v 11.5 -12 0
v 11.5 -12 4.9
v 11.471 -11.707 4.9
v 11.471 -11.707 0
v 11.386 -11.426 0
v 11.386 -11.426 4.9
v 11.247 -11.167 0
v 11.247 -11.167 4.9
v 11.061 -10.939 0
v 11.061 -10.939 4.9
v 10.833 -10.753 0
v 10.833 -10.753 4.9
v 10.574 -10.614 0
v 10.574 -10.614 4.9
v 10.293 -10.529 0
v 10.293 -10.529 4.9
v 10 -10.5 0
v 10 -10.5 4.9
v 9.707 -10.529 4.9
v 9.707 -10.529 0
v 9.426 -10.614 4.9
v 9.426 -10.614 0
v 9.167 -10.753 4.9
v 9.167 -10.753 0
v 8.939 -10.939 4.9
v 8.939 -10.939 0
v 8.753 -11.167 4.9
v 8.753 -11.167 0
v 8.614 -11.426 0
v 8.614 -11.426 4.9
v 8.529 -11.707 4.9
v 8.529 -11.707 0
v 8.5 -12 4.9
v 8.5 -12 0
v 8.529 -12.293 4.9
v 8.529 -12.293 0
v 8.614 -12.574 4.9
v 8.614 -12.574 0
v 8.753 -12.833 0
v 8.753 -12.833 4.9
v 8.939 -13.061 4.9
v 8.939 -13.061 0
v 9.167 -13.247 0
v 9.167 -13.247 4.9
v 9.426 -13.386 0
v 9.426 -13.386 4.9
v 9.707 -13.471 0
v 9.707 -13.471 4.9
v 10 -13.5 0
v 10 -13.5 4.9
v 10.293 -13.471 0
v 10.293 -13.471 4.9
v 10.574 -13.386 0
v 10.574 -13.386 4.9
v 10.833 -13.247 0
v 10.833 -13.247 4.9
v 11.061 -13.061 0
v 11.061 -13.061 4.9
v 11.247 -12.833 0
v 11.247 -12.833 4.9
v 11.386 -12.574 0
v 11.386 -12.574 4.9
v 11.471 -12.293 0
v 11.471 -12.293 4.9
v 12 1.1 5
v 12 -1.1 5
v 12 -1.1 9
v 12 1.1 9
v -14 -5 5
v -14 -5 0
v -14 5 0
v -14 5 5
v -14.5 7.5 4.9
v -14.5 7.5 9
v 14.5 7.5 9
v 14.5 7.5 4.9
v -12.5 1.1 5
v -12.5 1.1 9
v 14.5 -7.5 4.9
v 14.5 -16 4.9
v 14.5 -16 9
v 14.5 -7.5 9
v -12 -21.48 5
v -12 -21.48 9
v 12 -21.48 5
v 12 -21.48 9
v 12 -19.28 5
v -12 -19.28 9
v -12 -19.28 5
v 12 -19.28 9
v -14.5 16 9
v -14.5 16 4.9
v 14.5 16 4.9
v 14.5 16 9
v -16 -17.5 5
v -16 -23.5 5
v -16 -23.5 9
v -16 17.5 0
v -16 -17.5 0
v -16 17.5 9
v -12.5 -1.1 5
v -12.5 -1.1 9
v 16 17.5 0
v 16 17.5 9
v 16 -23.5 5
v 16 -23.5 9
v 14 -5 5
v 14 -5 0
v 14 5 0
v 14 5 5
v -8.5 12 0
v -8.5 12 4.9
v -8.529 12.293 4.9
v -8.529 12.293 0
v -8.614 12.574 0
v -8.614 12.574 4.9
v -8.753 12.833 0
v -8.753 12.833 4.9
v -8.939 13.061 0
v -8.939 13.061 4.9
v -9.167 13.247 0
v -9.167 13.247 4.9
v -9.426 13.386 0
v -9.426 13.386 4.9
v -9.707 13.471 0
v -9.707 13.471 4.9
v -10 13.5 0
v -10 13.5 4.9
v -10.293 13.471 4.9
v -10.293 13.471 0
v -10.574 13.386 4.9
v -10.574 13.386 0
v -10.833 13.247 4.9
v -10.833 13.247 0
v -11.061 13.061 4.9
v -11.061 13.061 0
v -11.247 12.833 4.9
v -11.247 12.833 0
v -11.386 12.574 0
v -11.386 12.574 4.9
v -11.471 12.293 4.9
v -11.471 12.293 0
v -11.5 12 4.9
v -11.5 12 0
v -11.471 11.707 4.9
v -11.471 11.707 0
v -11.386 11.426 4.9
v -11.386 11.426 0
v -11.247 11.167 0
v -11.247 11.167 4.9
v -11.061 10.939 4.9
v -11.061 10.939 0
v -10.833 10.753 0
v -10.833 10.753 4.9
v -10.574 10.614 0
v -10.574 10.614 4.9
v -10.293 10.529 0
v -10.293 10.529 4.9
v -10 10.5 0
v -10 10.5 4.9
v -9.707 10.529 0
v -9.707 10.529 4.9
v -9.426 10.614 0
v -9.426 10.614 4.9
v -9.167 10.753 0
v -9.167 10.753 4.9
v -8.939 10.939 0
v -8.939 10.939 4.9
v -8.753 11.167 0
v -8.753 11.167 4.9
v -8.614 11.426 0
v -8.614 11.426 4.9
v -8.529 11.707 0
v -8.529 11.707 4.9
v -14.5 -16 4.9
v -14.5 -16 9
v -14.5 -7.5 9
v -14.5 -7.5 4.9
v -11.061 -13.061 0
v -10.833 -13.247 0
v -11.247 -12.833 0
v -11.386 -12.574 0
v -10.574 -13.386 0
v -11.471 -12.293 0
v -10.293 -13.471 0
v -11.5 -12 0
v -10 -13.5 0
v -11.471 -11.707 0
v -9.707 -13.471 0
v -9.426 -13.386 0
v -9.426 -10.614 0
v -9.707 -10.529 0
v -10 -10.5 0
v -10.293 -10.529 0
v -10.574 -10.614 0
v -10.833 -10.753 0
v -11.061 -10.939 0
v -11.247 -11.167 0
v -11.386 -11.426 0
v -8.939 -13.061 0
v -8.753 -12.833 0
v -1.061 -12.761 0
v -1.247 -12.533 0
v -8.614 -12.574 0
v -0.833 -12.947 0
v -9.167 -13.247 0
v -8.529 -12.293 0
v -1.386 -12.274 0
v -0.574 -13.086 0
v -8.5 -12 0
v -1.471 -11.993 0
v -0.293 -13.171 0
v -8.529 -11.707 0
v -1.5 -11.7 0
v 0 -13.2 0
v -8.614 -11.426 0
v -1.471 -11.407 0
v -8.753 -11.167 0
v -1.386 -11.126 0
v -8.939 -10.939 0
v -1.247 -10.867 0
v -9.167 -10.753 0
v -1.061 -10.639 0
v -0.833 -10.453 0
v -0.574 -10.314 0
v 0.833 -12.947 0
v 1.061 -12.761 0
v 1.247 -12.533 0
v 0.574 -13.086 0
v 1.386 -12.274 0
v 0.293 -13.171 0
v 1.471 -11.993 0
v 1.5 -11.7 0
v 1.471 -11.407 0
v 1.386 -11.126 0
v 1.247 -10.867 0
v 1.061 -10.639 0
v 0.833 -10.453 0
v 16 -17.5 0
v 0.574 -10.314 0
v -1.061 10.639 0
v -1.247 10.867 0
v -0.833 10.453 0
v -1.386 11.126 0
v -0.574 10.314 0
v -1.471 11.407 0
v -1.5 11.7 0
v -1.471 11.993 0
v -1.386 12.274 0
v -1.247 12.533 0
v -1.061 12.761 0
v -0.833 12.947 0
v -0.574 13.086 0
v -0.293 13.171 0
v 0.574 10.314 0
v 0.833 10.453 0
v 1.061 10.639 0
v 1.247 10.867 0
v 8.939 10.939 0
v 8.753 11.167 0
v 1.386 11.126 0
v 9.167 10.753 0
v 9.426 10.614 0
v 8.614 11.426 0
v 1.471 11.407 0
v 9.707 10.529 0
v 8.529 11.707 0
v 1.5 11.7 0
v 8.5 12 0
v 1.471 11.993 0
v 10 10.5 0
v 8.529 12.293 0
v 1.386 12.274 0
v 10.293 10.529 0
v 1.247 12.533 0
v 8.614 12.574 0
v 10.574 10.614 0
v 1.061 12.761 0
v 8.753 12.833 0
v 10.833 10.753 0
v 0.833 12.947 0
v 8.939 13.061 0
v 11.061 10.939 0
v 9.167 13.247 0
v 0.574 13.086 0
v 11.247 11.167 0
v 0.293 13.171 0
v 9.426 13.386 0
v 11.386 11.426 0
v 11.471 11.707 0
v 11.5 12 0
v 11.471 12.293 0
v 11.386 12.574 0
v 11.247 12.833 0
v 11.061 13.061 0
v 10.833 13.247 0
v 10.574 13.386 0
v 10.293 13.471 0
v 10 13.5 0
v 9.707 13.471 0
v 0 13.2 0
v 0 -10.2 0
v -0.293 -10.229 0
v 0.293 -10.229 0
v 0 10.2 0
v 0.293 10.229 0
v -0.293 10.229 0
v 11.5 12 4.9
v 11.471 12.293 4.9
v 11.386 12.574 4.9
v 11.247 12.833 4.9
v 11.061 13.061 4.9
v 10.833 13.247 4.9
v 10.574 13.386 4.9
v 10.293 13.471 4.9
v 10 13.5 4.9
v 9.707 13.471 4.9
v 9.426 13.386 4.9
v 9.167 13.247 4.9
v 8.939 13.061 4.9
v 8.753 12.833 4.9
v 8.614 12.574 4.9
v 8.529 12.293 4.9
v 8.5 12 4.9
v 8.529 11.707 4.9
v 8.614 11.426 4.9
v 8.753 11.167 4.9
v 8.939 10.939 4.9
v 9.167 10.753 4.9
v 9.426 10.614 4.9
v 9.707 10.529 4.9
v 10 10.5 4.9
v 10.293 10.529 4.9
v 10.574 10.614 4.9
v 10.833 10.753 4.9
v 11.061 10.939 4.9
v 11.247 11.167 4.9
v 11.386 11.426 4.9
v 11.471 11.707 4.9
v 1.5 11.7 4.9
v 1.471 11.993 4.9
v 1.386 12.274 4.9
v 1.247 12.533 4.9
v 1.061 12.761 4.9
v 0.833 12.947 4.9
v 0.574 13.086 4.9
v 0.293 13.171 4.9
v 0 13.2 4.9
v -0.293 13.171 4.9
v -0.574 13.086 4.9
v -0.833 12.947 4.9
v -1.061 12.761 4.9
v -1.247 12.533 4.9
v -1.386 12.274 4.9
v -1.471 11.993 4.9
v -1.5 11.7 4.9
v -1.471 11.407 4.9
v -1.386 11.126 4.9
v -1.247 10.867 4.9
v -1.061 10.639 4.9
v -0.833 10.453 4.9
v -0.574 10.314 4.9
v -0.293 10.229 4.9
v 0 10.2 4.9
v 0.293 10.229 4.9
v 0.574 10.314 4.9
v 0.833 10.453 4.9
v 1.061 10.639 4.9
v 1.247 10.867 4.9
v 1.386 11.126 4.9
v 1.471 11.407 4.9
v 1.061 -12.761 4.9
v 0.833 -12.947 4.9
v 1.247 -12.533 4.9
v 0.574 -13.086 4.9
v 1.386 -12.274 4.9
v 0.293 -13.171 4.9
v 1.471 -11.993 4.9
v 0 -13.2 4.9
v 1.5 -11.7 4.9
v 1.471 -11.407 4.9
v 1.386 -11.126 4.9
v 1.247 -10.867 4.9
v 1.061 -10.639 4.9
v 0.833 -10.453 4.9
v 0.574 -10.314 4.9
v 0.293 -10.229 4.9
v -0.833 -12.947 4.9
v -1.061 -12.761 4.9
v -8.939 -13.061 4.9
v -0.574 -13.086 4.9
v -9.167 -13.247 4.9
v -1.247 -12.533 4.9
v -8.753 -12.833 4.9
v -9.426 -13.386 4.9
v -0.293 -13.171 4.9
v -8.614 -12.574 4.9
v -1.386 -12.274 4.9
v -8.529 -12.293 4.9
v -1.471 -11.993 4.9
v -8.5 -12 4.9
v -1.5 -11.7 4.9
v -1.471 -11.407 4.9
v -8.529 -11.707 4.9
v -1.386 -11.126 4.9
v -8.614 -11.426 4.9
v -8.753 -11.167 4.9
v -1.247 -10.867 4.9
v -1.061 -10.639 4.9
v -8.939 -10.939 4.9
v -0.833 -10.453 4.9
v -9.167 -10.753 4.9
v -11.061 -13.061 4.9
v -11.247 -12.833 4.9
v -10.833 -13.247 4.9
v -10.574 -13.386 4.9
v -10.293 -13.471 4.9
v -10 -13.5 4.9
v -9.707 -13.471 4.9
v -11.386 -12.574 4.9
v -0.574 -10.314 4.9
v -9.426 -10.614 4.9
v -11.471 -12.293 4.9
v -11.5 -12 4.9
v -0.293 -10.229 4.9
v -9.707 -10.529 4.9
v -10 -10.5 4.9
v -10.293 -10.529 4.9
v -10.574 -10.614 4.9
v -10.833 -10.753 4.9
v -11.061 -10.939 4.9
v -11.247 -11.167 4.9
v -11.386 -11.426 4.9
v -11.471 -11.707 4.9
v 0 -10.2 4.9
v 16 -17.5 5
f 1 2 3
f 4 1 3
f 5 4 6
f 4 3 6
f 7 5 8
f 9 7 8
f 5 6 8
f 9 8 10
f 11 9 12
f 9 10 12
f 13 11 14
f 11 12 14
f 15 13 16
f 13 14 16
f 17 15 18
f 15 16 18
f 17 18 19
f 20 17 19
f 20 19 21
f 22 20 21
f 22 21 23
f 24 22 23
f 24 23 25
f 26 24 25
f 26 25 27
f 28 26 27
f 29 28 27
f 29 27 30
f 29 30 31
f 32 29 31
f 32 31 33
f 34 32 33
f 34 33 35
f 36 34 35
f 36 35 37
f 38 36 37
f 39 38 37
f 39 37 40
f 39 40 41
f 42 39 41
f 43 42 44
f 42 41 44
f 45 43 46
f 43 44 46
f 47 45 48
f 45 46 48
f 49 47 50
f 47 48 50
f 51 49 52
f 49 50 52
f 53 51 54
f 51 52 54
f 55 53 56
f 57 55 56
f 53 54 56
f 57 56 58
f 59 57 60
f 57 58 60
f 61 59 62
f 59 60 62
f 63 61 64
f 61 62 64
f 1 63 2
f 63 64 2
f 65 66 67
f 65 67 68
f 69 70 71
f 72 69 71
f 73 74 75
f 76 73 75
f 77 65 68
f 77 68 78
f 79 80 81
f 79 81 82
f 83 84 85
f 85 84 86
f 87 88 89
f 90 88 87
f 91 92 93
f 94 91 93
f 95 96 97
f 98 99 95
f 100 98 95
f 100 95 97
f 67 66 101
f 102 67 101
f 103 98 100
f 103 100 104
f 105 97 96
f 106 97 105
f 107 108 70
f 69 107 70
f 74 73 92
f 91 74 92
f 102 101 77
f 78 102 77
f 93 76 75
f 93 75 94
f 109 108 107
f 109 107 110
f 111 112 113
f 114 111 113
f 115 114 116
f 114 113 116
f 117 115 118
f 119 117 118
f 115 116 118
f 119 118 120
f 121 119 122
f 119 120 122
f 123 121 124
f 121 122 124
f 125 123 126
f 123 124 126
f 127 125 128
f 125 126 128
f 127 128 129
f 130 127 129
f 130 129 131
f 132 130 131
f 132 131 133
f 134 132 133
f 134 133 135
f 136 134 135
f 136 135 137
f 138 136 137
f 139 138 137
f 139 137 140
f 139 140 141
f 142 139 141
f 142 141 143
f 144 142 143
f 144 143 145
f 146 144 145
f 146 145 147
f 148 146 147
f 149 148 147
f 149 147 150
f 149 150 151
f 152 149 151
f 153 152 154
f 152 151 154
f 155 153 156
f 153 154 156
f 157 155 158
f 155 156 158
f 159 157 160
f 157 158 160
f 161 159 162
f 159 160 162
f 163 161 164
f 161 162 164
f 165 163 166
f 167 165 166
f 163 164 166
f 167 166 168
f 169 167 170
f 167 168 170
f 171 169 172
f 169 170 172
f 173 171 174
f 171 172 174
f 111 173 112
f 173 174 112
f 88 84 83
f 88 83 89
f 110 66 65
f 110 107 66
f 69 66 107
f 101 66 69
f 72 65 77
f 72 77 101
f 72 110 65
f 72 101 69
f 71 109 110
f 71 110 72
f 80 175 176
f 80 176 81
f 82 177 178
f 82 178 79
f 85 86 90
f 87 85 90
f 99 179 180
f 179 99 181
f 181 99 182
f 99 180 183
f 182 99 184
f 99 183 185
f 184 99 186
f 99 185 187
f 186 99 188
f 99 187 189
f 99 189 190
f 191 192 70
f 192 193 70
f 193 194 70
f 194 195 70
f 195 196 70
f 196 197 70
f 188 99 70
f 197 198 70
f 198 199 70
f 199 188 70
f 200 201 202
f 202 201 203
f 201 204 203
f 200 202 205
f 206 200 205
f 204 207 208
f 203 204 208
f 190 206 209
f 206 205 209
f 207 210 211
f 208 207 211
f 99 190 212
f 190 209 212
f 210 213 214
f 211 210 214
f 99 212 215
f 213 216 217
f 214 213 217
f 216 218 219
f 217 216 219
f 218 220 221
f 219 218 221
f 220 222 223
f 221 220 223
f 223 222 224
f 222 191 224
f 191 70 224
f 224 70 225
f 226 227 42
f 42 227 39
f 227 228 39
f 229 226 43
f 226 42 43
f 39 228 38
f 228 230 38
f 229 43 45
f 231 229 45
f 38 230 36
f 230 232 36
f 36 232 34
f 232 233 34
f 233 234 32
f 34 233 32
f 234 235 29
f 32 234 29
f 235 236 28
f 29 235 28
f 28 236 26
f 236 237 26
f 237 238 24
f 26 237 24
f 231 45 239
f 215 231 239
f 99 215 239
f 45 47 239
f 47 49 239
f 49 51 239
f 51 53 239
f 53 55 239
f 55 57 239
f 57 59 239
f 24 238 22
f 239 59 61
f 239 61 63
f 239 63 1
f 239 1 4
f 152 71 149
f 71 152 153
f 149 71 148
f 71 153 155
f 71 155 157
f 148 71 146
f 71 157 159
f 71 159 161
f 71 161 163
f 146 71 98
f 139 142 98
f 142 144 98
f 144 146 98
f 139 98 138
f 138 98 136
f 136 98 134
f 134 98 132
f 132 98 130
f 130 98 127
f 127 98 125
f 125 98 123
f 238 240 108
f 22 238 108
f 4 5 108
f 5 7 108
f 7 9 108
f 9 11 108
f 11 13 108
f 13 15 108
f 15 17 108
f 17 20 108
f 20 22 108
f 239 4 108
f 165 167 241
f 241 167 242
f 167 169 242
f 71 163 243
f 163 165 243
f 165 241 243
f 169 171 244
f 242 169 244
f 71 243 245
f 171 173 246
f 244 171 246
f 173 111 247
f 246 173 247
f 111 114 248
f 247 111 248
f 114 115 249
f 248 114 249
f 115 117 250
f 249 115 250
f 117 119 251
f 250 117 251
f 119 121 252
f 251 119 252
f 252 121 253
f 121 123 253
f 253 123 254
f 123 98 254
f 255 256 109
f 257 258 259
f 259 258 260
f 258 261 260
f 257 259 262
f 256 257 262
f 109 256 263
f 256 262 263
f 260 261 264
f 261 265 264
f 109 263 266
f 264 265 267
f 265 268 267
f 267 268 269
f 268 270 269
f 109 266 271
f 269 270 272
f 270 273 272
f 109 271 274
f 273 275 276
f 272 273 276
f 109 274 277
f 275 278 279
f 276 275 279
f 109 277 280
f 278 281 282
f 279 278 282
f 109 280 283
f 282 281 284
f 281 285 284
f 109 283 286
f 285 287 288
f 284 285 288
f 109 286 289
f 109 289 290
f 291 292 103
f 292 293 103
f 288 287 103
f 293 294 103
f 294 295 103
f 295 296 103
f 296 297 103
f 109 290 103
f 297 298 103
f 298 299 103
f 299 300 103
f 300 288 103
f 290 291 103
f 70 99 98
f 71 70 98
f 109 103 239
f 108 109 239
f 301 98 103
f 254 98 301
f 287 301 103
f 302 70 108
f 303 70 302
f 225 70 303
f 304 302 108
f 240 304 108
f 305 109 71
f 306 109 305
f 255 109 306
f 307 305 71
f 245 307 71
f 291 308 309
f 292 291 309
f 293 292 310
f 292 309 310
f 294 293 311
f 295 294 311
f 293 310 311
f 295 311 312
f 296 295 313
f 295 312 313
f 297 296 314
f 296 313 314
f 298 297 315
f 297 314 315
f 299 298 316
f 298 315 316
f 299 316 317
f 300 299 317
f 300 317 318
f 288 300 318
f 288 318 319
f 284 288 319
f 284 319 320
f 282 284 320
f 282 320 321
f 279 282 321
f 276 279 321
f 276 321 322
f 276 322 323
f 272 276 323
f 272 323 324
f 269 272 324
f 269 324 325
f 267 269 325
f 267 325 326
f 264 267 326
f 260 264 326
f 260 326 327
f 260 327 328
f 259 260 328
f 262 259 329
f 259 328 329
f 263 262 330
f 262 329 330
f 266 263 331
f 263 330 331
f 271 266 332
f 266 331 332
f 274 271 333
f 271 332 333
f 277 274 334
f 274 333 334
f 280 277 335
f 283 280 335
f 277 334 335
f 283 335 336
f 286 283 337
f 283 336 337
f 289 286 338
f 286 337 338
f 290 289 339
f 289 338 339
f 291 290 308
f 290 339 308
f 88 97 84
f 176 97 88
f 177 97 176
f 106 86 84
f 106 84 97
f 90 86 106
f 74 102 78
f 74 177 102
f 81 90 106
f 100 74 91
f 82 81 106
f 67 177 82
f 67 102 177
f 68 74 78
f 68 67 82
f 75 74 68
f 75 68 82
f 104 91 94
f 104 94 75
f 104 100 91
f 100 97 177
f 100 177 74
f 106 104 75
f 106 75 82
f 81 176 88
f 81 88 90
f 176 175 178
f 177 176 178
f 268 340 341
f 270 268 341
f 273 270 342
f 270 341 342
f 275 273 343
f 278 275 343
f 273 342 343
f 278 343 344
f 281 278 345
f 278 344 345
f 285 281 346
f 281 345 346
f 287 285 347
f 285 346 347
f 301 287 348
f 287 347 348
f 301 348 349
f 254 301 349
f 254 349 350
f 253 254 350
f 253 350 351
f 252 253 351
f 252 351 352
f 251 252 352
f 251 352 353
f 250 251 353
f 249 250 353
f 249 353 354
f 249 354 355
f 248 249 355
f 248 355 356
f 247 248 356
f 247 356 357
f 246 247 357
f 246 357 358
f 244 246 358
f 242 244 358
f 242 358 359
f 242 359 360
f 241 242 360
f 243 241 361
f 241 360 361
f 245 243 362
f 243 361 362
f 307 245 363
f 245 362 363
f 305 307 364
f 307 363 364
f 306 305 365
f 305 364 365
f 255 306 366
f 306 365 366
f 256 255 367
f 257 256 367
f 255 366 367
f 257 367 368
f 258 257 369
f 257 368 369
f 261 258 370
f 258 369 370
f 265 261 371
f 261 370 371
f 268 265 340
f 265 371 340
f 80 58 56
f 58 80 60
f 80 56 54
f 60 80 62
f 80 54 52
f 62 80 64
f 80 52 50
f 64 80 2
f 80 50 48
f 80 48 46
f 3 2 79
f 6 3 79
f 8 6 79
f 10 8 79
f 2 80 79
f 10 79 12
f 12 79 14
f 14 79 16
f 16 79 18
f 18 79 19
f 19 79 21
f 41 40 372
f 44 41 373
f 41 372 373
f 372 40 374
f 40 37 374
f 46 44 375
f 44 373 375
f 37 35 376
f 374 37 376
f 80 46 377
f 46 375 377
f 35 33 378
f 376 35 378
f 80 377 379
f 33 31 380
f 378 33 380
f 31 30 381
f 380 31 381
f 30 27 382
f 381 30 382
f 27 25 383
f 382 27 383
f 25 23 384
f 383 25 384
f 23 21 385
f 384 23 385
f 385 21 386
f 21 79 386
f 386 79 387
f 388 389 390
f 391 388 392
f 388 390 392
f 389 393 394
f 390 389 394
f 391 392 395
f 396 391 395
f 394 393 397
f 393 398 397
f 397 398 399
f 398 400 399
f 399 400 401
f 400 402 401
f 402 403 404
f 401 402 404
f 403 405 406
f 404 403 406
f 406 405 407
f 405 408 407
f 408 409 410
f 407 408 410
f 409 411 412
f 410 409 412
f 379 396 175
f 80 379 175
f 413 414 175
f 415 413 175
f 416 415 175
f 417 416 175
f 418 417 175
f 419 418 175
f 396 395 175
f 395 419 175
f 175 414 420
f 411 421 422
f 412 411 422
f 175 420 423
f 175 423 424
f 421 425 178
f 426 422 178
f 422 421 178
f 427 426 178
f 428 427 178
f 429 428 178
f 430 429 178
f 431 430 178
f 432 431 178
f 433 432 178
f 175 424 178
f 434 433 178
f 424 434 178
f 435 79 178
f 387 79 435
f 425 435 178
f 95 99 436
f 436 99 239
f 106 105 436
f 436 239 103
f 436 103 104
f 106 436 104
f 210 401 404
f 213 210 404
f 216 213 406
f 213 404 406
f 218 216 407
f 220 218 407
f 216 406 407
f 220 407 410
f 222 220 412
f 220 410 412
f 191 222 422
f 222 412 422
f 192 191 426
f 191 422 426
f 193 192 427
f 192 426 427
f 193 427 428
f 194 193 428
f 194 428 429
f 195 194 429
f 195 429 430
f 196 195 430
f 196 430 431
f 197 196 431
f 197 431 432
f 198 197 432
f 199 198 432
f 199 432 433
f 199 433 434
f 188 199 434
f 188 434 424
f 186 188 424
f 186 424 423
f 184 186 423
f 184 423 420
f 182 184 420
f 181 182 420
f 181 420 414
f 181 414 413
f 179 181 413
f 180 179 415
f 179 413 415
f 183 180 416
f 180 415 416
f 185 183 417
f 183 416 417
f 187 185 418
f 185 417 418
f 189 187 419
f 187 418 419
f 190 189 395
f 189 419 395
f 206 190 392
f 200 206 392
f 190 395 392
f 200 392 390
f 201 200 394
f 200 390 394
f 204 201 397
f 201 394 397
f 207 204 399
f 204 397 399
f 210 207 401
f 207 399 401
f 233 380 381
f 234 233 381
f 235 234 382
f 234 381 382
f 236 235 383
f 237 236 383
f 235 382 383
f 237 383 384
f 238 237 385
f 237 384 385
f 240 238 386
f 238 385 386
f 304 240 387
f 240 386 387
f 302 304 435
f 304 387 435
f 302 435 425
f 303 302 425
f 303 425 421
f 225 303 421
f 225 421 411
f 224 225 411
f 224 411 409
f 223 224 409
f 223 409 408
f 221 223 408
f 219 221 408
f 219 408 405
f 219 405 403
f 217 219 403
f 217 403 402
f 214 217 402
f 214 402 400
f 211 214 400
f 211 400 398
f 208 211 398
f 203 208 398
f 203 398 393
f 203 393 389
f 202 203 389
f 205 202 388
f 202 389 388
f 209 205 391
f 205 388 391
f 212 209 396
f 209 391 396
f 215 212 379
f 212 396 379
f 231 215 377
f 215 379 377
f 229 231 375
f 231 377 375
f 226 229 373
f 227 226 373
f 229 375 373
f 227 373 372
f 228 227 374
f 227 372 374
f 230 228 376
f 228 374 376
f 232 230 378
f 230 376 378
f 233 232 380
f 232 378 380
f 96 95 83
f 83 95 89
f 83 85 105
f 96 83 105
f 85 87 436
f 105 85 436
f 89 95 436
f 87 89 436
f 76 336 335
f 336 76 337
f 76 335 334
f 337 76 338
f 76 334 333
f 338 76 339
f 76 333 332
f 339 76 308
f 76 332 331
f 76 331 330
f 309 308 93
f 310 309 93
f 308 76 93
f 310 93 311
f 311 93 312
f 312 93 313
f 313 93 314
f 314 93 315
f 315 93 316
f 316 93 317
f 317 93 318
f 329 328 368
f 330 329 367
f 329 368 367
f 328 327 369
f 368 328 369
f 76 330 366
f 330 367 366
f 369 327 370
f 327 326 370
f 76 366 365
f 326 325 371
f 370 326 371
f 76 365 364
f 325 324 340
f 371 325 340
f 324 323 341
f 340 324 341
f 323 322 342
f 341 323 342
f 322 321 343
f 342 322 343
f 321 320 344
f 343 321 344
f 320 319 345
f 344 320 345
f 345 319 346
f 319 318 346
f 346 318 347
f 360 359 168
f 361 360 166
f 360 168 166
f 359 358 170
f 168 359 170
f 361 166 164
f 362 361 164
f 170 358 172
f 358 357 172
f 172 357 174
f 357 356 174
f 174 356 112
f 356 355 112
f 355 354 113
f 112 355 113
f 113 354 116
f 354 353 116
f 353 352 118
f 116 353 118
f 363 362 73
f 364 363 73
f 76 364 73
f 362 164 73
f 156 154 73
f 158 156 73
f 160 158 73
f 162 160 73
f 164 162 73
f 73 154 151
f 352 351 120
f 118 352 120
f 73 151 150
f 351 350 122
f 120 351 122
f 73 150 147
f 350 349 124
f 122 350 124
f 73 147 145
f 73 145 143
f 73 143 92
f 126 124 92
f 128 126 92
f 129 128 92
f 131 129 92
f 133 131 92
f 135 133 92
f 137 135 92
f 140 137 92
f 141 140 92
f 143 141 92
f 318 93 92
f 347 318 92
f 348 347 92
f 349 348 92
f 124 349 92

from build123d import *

# Parameters (mm, degrees)
SKETCH4_W                 = 32
SKETCH4_H                 = 35
BOSS_EXTRUDE1_DEPTH       = 9
SHELL1_T                  = -1.5
SHELL1_THICKNESS_2_FACE_W = 29
SHELL1_THICKNESS_2_FACE_H = 32
SHELL1_THICKNESS_2_DEPTH  = 3.4
SKETCH5_R                 = 1.5
CUT_EXTRUDE2_DEPTH        = 9
RIB6_REACH                = 27.362
SKETCH12_WALLS_W          = 81.724747412
SKETCH12_WALLS_H          = 15
SKETCH13_W                = 28
SKETCH13_H                = 10
CUT_EXTRUDE3_DEPTH        = 5
SKETCH15_W                = 24.5
SKETCH15_H                = 2.2
CUT_EXTRUDE4_DEPTH        = 10
SKETCH16_W                = 32
SKETCH16_H                = 4
BOSS_EXTRUDE2_DEPTH       = 6
SKETCH17_W                = 24
SKETCH17_H                = 2.2
CUT_EXTRUDE5_DEPTH        = 10


with BuildPart() as part:
    # Sketch4 → Boss-Extrude1 (new body)
    with BuildSketch(Plane.XY):
        Rectangle(SKETCH4_W, SKETCH4_H)
    extrude(amount=BOSS_EXTRUDE1_DEPTH)

    # Shell1
    shell1_openings = [part.faces().sort_by_distance(p)[0] for p in [
        (0, 0, 9),
    ]]
    offset(amount=SHELL1_T, openings=shell1_openings, kind=Kind.INTERSECTION)

    # Shell1 thickness 2 face (on inner face of the shell) → Shell1 thickness 2 (add)
    with BuildSketch(Plane(origin=(0, 0, 1.5), x_dir=(-1, 0, 0), z_dir=(0, 0, -1))):
        Rectangle(SHELL1_THICKNESS_2_FACE_W, SHELL1_THICKNESS_2_FACE_H)
    extrude(amount=-SHELL1_THICKNESS_2_DEPTH)

    # Sketch5 → Cut-Extrude2 (cut)
    with BuildSketch(Plane.XY.offset(4.9)):
        with Locations((-10, -12)):
            Circle(SKETCH5_R)
        with Locations((10, -12)):
            Circle(SKETCH5_R)
        with Locations((0, 11.7)):
            Circle(SKETCH5_R)
        with Locations((0, -11.7)):
            Circle(SKETCH5_R)
        with Locations((-10, 12)):
            Circle(SKETCH5_R)
        with Locations((10, 12)):
            Circle(SKETCH5_R)
    extrude(amount=-CUT_EXTRUDE2_DEPTH, mode=Mode.SUBTRACT)

    # Sketch12 walls → Rib6 (add, up to next)
    with BuildSketch(Plane.XY.offset(9), mode=Mode.PRIVATE) as rib6_sk1:
        Rectangle(SKETCH12_WALLS_W, SKETCH12_WALLS_H)
    rib6_tool1 = extrude(rib6_sk1.sketch, amount=-RIB6_REACH, mode=Mode.PRIVATE) - part.part
    add(rib6_tool1.solids().sort_by_distance((0, 0, 9))[0])

    # Sketch13 → Cut-Extrude3 (cut)
    with BuildSketch(Plane(origin=(0, 0, 0), x_dir=(-1, 0, 0), z_dir=(0, 0, -1))):
        Rectangle(SKETCH13_W, SKETCH13_H)
    extrude(amount=-CUT_EXTRUDE3_DEPTH, mode=Mode.SUBTRACT)

    # Sketch15 → Cut-Extrude4 (cut)
    with BuildSketch(Plane(origin=(0, 0, 5), x_dir=(-1, 0, 0), z_dir=(0, 0, -1))):
        with Locations((0.25, 0)):
            Rectangle(SKETCH15_W, SKETCH15_H)
    extrude(amount=-CUT_EXTRUDE4_DEPTH, mode=Mode.SUBTRACT)

    # Sketch16 → Boss-Extrude2 (add)
    with BuildSketch(Plane.XZ.offset(17.5)):
        with Locations((0, 7)):
            Rectangle(SKETCH16_W, SKETCH16_H)
    extrude(amount=BOSS_EXTRUDE2_DEPTH)

    # Sketch17 → Cut-Extrude5 (cut)
    with BuildSketch(Plane.XY.offset(9)):
        with Locations((0, -20.38)):
            Rectangle(SKETCH17_W, SKETCH17_H)
    extrude(amount=-CUT_EXTRUDE5_DEPTH, mode=Mode.SUBTRACT)


solid = part.part
